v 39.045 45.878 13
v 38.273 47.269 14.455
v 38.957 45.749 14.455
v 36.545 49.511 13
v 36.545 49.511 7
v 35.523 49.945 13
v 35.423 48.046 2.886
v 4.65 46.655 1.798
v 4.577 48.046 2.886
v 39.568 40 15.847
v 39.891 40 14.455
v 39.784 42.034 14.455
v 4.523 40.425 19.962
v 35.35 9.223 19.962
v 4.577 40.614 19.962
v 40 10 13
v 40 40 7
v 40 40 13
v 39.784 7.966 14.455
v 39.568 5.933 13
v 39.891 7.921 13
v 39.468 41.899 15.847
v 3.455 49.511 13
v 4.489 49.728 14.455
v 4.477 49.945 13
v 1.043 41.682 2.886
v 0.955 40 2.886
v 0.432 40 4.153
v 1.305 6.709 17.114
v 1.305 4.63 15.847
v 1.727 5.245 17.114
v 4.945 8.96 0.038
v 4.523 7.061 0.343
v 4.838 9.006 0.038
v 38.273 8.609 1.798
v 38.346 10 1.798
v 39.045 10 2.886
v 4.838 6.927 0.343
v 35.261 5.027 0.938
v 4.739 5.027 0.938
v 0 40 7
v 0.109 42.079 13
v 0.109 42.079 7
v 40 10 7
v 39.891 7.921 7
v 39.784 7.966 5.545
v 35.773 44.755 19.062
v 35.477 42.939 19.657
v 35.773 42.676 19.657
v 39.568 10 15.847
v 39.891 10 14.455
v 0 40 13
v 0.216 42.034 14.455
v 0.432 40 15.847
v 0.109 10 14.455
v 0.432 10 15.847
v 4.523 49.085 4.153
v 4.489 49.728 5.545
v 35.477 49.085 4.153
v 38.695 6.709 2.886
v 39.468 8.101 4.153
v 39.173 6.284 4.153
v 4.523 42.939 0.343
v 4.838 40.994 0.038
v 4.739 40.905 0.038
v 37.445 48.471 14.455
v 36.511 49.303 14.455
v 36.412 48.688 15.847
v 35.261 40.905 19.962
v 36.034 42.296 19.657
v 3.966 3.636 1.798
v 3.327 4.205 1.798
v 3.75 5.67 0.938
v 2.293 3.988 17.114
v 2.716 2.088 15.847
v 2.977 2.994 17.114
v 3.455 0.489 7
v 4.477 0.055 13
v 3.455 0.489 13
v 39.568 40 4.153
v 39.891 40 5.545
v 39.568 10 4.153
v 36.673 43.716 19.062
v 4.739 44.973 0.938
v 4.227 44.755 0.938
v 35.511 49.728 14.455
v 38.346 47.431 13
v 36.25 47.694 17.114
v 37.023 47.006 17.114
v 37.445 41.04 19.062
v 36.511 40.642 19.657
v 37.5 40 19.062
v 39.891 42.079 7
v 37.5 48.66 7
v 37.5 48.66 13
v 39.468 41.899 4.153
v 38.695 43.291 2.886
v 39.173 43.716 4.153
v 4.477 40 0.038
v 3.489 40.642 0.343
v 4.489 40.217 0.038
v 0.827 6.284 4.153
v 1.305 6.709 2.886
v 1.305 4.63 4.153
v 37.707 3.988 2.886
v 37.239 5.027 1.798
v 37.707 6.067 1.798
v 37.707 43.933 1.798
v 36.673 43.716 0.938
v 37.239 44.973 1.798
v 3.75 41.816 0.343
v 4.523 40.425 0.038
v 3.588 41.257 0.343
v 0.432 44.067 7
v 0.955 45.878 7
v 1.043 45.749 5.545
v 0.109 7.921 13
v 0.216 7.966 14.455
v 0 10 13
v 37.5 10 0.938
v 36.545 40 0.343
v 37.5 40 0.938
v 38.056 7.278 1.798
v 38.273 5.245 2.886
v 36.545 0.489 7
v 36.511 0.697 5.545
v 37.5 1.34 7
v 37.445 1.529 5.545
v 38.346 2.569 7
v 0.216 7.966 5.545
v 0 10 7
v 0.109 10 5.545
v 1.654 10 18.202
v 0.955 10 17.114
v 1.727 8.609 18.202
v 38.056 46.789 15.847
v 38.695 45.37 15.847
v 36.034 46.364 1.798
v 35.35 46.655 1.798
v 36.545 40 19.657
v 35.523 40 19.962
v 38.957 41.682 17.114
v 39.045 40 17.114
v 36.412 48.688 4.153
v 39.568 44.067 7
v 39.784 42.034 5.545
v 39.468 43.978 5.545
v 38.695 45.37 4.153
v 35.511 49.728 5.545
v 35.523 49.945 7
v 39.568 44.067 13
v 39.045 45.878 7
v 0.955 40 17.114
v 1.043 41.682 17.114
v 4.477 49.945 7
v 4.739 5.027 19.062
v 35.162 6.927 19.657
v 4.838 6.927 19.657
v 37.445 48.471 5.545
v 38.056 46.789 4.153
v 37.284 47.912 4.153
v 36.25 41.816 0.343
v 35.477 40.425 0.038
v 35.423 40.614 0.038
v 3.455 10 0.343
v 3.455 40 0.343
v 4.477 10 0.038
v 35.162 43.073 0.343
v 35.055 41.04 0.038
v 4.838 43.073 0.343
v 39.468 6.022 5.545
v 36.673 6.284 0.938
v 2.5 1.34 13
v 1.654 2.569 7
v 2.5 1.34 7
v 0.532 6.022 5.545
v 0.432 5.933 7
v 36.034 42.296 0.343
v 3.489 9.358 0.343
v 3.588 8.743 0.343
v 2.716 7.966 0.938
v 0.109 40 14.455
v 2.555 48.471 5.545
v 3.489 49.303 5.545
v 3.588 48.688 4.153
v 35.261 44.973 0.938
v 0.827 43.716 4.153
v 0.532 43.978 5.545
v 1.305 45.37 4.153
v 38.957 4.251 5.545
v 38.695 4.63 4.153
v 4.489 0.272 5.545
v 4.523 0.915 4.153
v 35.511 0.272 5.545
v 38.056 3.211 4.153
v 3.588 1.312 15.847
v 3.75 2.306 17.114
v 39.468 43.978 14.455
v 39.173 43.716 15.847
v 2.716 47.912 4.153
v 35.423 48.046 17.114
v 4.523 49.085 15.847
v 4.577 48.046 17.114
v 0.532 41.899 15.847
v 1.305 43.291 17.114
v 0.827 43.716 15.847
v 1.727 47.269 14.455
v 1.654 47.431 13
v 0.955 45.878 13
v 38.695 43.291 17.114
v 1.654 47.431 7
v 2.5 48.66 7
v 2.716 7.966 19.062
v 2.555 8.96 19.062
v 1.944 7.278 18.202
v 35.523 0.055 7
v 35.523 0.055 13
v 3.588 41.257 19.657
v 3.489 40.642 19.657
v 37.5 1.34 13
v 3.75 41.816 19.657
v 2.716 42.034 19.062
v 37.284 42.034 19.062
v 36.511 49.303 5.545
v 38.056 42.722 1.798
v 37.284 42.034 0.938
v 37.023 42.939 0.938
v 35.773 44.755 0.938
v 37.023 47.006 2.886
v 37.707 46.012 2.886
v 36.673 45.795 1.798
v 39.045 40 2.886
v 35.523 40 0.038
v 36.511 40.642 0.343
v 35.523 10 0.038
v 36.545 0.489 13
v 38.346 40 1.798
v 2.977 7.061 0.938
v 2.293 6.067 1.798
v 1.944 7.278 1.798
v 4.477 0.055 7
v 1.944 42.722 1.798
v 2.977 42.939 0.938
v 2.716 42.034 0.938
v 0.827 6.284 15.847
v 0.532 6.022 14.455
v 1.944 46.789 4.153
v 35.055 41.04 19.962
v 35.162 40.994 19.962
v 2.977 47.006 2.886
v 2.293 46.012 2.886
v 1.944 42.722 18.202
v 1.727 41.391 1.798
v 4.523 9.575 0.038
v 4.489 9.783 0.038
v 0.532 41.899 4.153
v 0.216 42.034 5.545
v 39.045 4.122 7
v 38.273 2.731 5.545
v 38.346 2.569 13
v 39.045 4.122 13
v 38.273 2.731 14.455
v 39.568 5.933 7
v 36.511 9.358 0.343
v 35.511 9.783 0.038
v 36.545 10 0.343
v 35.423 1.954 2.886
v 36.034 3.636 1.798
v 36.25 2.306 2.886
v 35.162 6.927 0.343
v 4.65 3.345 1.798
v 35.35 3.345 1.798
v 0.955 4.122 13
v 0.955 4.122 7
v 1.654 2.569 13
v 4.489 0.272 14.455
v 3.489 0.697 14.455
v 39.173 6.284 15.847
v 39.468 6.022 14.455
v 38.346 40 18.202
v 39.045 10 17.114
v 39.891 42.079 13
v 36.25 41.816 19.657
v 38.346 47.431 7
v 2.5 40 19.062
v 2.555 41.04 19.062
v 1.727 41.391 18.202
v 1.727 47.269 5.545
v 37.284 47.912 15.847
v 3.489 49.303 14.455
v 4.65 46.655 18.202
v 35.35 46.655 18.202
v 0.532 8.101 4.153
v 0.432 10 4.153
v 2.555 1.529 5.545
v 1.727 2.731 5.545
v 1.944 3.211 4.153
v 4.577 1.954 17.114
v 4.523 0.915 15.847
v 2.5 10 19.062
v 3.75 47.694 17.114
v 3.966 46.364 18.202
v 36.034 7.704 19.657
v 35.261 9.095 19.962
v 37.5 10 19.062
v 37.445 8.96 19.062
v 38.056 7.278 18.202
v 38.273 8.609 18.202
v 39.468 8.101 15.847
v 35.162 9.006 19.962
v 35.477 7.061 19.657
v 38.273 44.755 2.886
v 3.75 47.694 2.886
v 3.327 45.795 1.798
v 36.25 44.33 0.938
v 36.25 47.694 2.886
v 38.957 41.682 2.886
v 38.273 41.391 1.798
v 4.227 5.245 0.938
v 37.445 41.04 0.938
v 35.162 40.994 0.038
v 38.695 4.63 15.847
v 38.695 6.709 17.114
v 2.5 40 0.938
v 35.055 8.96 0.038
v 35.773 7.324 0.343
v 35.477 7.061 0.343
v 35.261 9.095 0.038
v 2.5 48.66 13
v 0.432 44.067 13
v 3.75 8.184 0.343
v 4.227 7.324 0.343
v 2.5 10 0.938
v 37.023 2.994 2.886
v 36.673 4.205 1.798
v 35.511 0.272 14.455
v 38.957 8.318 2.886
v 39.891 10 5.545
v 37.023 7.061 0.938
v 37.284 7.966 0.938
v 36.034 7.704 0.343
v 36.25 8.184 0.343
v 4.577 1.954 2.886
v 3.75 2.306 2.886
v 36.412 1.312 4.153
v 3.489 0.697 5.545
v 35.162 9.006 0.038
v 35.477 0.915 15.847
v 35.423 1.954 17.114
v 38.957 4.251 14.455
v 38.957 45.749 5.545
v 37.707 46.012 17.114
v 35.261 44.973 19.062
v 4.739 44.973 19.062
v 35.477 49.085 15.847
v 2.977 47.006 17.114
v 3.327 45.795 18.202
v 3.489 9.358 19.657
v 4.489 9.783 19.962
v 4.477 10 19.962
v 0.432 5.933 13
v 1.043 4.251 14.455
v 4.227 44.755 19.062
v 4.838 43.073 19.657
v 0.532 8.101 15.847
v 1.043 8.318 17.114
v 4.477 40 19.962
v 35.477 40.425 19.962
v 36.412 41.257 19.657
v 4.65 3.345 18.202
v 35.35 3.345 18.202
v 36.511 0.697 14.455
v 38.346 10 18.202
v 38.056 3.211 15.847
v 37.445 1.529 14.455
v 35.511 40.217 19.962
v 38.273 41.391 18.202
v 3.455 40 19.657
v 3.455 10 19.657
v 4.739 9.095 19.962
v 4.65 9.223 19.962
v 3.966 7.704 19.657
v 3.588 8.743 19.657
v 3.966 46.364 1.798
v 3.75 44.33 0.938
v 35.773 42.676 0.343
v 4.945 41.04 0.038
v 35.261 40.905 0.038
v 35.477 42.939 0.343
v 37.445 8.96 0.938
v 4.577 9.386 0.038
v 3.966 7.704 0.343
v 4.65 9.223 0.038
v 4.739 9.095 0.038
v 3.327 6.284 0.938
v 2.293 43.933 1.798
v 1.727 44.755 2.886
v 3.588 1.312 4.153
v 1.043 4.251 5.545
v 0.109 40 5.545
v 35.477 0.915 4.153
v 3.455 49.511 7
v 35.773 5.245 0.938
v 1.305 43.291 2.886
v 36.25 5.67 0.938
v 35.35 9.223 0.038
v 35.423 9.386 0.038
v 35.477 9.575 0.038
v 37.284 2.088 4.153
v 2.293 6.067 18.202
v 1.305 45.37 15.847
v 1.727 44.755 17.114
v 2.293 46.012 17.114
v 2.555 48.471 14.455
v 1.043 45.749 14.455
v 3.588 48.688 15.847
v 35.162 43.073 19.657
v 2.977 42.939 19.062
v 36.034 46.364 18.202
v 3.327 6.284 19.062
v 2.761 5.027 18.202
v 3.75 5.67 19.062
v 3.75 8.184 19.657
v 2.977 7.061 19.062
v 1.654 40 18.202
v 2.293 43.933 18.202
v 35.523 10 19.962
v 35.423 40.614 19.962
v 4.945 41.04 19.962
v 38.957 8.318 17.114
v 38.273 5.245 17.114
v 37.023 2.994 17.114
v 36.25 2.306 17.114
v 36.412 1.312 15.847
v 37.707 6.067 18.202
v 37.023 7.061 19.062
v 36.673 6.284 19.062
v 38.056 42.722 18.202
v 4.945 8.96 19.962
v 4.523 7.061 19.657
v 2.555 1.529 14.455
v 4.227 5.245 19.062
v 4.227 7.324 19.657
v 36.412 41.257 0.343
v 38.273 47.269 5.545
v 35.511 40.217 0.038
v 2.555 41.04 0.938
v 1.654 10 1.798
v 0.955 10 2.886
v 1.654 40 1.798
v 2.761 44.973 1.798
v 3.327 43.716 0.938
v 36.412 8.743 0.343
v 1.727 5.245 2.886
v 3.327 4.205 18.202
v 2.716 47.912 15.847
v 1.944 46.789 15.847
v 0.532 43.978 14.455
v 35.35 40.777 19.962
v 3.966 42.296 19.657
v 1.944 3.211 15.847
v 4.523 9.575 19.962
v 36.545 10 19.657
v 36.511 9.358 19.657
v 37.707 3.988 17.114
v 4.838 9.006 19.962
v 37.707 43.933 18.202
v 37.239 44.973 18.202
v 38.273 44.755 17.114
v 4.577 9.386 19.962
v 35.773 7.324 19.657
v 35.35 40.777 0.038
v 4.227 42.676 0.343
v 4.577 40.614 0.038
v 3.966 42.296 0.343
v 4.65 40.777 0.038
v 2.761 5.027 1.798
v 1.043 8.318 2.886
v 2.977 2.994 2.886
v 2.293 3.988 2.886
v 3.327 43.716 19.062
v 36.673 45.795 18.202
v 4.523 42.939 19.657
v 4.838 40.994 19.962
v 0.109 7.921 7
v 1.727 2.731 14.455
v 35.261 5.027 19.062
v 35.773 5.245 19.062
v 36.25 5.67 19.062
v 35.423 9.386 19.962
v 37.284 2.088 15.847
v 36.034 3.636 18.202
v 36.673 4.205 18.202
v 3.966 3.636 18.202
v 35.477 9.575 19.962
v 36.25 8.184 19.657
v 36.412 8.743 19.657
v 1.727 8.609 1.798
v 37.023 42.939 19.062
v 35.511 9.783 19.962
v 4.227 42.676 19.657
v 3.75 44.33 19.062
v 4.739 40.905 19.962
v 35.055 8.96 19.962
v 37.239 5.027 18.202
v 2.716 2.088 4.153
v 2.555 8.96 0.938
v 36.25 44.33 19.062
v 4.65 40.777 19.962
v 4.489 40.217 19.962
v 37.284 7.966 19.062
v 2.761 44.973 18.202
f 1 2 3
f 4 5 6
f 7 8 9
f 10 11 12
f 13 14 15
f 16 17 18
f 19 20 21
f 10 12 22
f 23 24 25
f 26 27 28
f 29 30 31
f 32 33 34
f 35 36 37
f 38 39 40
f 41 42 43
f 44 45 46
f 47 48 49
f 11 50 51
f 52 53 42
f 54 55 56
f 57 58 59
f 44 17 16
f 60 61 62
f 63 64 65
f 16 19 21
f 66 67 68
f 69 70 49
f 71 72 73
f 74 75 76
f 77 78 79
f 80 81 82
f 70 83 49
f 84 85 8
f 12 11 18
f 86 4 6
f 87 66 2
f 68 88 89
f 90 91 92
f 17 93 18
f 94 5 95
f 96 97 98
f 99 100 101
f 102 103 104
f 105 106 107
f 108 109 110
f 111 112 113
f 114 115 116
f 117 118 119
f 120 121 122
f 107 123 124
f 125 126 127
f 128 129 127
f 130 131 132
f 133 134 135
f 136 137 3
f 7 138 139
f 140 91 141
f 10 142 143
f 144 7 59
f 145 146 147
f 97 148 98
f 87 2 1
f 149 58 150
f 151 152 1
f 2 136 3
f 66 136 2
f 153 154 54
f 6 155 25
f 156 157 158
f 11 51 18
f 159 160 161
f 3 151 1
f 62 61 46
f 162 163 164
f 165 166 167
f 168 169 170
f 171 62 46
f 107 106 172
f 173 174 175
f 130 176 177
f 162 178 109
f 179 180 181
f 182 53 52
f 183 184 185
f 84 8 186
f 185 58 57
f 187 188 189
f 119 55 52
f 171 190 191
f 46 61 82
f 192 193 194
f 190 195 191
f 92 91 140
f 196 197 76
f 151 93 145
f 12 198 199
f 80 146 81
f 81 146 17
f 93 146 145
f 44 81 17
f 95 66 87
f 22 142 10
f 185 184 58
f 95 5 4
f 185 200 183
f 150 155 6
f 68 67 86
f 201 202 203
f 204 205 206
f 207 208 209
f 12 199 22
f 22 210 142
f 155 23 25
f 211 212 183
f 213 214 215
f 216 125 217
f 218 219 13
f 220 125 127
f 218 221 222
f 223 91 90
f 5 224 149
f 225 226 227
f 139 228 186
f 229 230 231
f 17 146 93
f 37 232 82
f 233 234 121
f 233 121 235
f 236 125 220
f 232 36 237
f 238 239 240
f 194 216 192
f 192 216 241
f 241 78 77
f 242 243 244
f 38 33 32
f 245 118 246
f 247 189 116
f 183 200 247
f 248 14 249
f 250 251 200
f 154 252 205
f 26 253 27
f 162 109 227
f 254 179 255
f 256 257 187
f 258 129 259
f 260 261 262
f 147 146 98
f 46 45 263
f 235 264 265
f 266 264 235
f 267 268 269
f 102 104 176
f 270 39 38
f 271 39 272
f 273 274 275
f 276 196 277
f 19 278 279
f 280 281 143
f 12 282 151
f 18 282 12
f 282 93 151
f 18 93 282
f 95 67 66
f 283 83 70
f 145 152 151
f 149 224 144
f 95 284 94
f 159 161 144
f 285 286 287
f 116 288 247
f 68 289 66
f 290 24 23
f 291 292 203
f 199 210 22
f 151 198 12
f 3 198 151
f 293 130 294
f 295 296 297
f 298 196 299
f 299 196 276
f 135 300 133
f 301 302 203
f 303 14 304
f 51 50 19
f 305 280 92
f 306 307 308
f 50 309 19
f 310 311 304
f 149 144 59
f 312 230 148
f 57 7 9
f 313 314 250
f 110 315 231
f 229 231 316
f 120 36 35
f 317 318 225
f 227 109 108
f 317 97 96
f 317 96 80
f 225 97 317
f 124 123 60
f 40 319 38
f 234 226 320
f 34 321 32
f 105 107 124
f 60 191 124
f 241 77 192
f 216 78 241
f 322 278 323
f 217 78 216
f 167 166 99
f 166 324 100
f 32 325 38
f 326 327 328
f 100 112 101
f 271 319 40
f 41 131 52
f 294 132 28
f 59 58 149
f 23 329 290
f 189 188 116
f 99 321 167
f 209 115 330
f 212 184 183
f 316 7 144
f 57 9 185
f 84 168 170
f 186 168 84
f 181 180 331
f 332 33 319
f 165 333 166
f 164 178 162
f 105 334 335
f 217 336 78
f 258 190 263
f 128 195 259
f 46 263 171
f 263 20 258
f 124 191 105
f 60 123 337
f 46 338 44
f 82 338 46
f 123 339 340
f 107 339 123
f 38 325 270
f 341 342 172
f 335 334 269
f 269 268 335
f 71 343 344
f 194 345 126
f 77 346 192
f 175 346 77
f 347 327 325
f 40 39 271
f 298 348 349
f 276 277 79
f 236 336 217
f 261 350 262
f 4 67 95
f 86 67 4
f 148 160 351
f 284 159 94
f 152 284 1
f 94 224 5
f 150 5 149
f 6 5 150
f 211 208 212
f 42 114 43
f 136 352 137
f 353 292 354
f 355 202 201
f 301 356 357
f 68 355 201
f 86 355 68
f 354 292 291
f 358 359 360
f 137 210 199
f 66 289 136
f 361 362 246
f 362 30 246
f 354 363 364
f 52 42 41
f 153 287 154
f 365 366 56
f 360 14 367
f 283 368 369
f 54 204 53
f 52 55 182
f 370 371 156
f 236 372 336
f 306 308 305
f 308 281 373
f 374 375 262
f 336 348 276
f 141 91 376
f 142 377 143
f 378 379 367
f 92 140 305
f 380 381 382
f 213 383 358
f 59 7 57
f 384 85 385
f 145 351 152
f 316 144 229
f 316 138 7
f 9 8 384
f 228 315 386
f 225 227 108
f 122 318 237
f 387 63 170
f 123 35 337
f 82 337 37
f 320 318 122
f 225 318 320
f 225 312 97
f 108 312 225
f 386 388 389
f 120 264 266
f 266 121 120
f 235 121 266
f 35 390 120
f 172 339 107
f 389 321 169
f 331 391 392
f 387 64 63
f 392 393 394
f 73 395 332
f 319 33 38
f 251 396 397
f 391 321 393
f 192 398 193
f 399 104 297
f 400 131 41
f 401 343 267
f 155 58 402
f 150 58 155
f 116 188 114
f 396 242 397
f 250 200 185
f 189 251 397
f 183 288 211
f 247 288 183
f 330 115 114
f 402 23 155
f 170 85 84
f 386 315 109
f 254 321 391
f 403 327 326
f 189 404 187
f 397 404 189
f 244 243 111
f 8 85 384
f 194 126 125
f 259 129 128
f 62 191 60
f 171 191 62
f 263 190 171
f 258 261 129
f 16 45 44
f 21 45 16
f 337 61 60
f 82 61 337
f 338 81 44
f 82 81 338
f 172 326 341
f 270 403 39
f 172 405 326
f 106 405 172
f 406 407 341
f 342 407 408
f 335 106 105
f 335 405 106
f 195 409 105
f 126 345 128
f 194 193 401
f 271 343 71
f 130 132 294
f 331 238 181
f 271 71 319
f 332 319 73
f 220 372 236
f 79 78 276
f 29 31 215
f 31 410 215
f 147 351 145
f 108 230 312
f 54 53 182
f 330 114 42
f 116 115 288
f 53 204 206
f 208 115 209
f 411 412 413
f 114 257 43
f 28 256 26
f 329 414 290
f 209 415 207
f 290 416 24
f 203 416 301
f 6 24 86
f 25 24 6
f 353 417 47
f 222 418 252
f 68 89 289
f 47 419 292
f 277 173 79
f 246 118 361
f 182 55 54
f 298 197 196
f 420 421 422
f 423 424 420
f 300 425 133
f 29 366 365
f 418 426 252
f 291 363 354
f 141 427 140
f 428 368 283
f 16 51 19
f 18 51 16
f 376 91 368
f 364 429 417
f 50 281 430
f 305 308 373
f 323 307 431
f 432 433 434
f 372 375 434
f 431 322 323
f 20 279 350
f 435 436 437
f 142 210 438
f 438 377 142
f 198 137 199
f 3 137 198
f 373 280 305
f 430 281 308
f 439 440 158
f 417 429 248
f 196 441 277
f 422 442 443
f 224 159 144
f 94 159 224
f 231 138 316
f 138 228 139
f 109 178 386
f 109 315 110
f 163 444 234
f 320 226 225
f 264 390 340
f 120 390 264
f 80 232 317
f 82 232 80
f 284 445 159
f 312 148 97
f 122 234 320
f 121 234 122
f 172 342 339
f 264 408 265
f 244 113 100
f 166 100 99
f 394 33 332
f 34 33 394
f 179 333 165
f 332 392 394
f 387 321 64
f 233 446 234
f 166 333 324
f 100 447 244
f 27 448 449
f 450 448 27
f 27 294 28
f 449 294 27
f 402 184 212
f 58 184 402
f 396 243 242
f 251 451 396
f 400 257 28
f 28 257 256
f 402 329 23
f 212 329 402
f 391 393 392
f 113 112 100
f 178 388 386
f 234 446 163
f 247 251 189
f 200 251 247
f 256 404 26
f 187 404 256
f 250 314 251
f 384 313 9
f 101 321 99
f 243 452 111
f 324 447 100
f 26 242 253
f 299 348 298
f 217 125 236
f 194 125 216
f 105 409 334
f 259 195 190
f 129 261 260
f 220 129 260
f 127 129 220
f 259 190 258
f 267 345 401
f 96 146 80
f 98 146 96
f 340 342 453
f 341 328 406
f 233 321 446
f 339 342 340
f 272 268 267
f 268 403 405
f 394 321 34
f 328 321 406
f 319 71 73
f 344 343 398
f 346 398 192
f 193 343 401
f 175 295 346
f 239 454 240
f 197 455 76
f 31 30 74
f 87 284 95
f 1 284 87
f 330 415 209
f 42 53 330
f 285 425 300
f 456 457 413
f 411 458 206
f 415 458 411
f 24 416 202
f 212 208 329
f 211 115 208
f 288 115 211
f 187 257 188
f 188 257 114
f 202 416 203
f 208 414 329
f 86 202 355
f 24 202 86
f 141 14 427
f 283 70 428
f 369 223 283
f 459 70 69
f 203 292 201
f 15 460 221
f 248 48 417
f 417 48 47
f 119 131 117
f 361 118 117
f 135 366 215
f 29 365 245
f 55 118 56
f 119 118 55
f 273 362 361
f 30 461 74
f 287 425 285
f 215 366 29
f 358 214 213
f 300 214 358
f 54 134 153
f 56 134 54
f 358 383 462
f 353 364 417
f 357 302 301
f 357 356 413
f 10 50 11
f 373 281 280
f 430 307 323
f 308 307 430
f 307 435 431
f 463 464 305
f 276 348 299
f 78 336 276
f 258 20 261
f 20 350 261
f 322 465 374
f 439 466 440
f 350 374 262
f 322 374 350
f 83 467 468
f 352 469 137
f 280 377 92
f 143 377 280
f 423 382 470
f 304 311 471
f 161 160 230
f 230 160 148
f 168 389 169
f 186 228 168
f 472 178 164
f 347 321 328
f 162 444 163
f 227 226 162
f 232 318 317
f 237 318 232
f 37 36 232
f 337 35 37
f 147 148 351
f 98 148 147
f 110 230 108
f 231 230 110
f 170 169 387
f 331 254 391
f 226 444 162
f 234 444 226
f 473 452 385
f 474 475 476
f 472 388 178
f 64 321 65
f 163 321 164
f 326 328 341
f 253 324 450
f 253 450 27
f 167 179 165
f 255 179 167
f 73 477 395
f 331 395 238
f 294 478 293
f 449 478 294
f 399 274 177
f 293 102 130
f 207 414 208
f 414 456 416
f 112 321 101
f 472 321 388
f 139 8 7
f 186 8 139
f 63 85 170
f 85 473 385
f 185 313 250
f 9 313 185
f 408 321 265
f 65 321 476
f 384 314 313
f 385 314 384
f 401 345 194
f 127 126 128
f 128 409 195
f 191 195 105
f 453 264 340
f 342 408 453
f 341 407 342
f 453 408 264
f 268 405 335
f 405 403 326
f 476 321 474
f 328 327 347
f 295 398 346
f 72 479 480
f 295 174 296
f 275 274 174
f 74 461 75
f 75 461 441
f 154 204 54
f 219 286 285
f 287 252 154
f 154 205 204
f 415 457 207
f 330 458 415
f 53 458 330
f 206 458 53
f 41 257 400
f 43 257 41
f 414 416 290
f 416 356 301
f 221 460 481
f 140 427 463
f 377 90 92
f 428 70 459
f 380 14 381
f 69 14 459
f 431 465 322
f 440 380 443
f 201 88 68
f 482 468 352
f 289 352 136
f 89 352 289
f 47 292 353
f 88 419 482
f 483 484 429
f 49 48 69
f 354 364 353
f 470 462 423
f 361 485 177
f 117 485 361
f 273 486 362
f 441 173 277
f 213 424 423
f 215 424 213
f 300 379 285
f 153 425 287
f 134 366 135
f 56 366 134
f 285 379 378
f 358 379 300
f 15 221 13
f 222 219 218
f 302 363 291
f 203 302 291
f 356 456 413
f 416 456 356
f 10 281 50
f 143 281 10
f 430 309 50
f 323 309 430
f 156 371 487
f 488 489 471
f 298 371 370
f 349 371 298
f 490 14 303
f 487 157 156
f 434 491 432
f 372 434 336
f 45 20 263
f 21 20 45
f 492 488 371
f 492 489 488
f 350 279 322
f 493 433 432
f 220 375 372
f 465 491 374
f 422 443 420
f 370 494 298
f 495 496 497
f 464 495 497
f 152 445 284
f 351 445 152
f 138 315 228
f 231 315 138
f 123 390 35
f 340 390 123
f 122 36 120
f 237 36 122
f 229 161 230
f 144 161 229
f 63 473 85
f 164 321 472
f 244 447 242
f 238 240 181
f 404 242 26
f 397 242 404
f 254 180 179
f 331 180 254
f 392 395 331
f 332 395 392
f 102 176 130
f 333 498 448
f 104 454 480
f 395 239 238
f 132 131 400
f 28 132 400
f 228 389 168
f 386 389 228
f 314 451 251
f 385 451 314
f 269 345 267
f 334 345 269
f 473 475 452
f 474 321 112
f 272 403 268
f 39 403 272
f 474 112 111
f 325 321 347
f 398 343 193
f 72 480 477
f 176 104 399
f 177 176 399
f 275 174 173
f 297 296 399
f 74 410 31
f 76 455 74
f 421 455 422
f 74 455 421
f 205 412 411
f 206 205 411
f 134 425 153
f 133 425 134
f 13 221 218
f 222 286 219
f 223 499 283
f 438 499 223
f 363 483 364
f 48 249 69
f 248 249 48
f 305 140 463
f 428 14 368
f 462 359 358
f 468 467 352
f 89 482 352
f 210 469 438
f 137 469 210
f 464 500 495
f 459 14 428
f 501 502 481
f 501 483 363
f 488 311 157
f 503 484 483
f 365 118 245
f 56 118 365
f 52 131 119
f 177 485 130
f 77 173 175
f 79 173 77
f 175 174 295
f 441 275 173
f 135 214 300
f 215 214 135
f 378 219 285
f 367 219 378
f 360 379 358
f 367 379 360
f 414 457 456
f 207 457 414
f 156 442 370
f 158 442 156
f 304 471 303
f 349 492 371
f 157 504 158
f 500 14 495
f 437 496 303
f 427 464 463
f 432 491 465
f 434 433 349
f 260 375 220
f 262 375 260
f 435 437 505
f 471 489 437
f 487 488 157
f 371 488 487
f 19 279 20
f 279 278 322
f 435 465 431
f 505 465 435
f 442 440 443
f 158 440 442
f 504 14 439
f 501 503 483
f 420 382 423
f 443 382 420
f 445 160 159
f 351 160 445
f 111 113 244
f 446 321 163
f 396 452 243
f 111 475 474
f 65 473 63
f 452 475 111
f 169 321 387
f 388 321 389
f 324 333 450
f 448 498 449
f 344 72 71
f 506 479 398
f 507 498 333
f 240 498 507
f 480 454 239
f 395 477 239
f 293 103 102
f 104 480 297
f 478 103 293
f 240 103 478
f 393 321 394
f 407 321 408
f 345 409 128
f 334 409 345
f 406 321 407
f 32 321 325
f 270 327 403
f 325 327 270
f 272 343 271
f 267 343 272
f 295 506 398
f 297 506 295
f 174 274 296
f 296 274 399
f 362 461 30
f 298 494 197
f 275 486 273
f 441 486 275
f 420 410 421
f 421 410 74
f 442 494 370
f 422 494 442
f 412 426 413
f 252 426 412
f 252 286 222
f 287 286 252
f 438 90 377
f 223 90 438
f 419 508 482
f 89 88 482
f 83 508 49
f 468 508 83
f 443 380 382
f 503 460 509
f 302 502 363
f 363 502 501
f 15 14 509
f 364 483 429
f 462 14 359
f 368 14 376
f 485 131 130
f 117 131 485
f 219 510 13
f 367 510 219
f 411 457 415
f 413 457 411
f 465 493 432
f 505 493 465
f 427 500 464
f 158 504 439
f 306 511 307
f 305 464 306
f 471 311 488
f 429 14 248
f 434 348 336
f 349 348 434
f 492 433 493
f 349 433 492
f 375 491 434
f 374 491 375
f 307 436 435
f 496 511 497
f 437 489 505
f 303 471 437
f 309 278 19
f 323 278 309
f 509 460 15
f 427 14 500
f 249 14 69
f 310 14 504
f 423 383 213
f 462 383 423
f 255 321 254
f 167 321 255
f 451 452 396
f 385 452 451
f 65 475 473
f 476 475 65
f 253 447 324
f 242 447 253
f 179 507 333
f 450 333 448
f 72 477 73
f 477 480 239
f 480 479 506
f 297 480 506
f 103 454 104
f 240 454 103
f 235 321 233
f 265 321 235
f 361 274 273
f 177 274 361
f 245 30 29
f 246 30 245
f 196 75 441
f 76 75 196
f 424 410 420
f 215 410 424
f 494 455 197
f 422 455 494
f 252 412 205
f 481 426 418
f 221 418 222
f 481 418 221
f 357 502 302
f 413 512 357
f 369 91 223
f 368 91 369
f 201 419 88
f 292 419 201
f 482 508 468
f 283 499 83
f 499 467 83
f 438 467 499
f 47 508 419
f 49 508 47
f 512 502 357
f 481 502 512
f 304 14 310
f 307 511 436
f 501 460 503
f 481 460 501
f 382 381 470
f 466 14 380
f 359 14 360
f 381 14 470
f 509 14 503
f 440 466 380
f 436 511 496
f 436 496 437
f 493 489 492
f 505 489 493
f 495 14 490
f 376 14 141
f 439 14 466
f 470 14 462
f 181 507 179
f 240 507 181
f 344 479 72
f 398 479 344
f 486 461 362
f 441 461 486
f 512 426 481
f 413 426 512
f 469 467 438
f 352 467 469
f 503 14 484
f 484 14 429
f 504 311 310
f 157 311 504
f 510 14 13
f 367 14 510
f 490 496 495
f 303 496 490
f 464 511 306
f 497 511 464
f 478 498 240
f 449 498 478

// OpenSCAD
/*
 *  OpenSCAD utilities 
 *
 *  by Ph.Gregoire AKA Greg Ware <greg.ware@laposte.net>
 *  
 *  Includes:
 *   - shorter macro modules to get a cube or cylinder with translation and rotation
 *   -  Due to some display defects in OpenSCAD preview (F5), some can use a small epsilon 
 *      so as to cut protruding apertures in solids
 *   - useful modules to build rounded corner cubes, triangle (wedges), etc
 *
 * History
 * Date         Author      Description
 * 2017/??/??   Ph.Gregoire Initial version(s)
 * 2018/07/18   Ph.Gregoire Rework for X5S corners
 *
 *  This work is licensed under the 
 *  Creative Commons Attribution 3.0 Unported License.
 *  To view a copy of this license, visit
 *    http://creativecommons.org/licenses/by/3.0/ 
 *  or send a letter to 
 *    Creative Commons, PO Box 1866, Mountain View, CA 94042, USA.
*/

// Thickness of supports for apertures
$_SUPPORT_THK=0.2;

// Cylinders $fn default
$_FN_CYL=32;

// Epsilon
$_EPSILON=0.2;

/* Translate and rotate children */
module trrot(tx,ty,tz,ax,ay,az) {
    translate([tx,ty,tz]) rotate([ax,ay,az]) children();
}

/* translated cube */
module trcube(tx,ty,tz,dx,dy,dz) {
    translate([tx,ty,tz]) cube([dx,dy,dz]);
}

/* translated cube with epsilons along Z */
module trcube_eps(tx,ty,tz,dx,dy,dz) {
    translate([tx,ty,tz-$_EPSILON]) cube([dx,dy,dz+2*$_EPSILON]);
}

/* translated cylinder */
module trcyl(tx,ty,tz,d,h,center=false,fn=$_FN_CYL) {
	translate([tx,ty,tz]) cylinder(d=d,h=h,center=center,$fn=fn);
}

/* translated cylinder with epsilon along height (Z) */
module trcyl_eps(tx,ty,tz,d,h,center=false,fn=$_FN_CYL) {
    translate([tx,ty,tz-$_EPSILON]) cylinder(d=d,h=h+2*$_EPSILON,center=center,$fn=fn);
}

module trrotcyl(tx,ty,tz,ax,ay,az,d,h,center=false,fn=$_FN_CYL) {
	trrot(tx,ty,tz,ax,ay,az) cylinder(d=d,h=h,center=center,$fn=fn);
}

/* translated and rotated cylinder with epsilon along height (Z) */
module trrotcyl_eps(tx,ty,tz,ax,ay,az,d,h,center=false,fn=$_FN_CYL) {
    trrot(tx,ty,tz,ax,ay,az) translate([0,0,-$_EPSILON]) cylinder(d=d,h=h+2*$_EPSILON,center=center,$fn=fn);
}

/* translated and rotated cube */
module trrotcube(tx,ty,tz,ax,ay,az,dx,dy,dz) {
    trrot(tx,ty,tz,ax,ay,az) cube([dx,dy,dz]);
}

/* Translated rotate cube with diff children (in cube referential) */
module trrotcube_diff(tx,ty,tz,ax,ay,az,dx,dy,dz) {
    trrot(tx,ty,tz,ax,ay,az) difference() {
        cube([dx,dy,dz]);
        children();
    }
}

/* Box with apertures cut out from children */
module boxWithApertures(w,l,h,t) {
    // Bottom
    trcube(-w/2-t,-l/2-t,0,w+2*t,l+2*t,t);

    // sides
    for(s=[0:3]) {
        L=w*((s+1)%2)+l*(s%2)+2*t;
        P=l*((s+1)%2)+w*(s%2);
        
        rotate([0,0,s*90]) {
            translate([-L/2,P/2,t]) {
                difference() {
                    cube([L,t,h]);
                    // aperture
                    if($children>s) {
                        translate([thk,thk,0]) rotate([90,0,0]) children(s);
                    }
                }
            }
        }
    }

}

/* Make a support: remove a thin support layer from a flat shape */
module supportDiff(thk) {
    difference() {
        children(0);
        translate([0,0,thk/2]) {
            linear_extrude(height=$_SUPPORT_THK) projection() children(0);
        }
    }
}

/* Lateral vents 
    n: number of vents
    h: height of vent and vent spacing
    l: horizontal length of vent
    x: horizontal x offset of vent
    z: vertical offset of first vent
    t: thickness of panel
*/
module vents(n,h,l,x,z,t) {
    for(v=[0:n-1]) {
        trcube_eps(x,z+2*v*h,0,l,h,t);
    }
}

/* Fan vent 
    w: width of panel
    dz: height of center of fan
    df: diameter of fan
    dh: diameter of hub
    fs: Number of fan spokes
    t: thickness of panel
*/
module fanvent(w,dz,df,dh,fs,t) {
    difference() {
        // External
        trcyl_eps(w/2,dz,0,df,t);
        
        // central hub
        trcyl_eps(w/2,dz,0,dh,t);
        
        // spokes
        translate([w/2,dz,0]) {
            for(a=[0:fs-1]) {
                rotate([0,0,180+a*(360/fs)]) trcube_eps(-t/2,0,0,t,df,t);
            }
        }
    }
}
/* Fan mounting holes
    w: Width of panel
    dz: height of center of fan
    wfh: width of fan holes
    dfh: diameter of fan holes
    t: thickness of panel
*/
module fanholes(w,dz,wfh,dfh,t) {
    for(x=[-1,1]) {
        for(y=[-1,1]) {
            trcyl_eps(w/2+wfh/2*x,dz+wfh/2*y,0,dfh,t);
        }
    }
}

/* Position children in one corner of box, using a centered box */
module cornerPos(w,l,h,x,y,center=true) {
    translate([center?x*w/2:(x+1)*w/2,center?y*l/2:(y+1)*l/2,h]) {
        if(x==-1 && y==-1) children();
        if(x==1 && y==-1) rotate([0,0,90]) children();
        if(x==1 && y==1) rotate([0,0,180]) children();
        if(x==-1 && y==1) rotate([0,0,270]) children();
    }
}

/* Position children at each 4 corners of centered cube */ 
module cornersPos(w,l,h,center=true) {
 for(x=[-1,1]) {
        for(y=[-1,1]) {
            cornerPos(w,l,h,x,y,center=center) children();
        }
    }
}


/* Quarter Cone */
module quarterCone(r1,r2,h) {
    intersection() {
        cylinder(r1=r2,r2=r1,h=h);
        cube([r1>r2?r1:r2,r1>r2?r1:r2,h]);
    }
}

module quarterCyl(r,h) {
    intersection() {
        cylinder(r=r,h=h,$fn=$_FN_CYL);
        cube([r,r,h]);
    }
}

/* Corner rounding */
module champfer(rounding,h) {
    difference() {
        translate([-$_EPSILON,-$_EPSILON,-$_EPSILON])
            cube([rounding+$_EPSILON,rounding+$_EPSILON,h+2*$_EPSILON]);
        translate([rounding,rounding])
            cylinder(r=rounding,h=h);
    }
}

/* Triangle by extrusion. the a parameter is the rotation angle */
module triangle(dx,dy,h,a=0) {
    if(a<0) triangle(dx,dy,h,a=a+360);
    else {
        a=a%360;
        linear_extrude(height=h) {
            if(a<90) polygon(points=[[0,0],[dx,0],[0,dy],[0,0]]);
            else if(a<180) polygon(points=[[0,0],[dx,dy],[dx,0],[0,0]]);
            else if(a<270) polygon(points=[[dx,dy],[0,dy],[dx,0],[dx,dy]]);
            else if(a<360) polygon(points=[[0,0],[dx,dy],[0,dy],[0,0]]);
        }
    }
}

module roundedFlatBox(dx,dy,h,r) {
    linear_extrude(height=h)
    offset(r=r)
    translate([r,r]) square([dx-2*r,dy-2*r]);
}

module roundedBoundingBox(dx,dy,dz,rx,ry,rz) {
    minkowski() {
        trcube(rx,ry,rz,dx-2*rx,dy-2*ry,dz-2*rz);
        r=max(rx,ry,rz);
        scale([rx/r,ry/r,rz/r]) sphere(r);
    }
}

test();

module test() {
    //triangle(30,20,10,270);
    //quarterCyl(5,10);
    //champfer(5,10);
    roundedBoundingBox(40,50,20,5,10,7);
}
